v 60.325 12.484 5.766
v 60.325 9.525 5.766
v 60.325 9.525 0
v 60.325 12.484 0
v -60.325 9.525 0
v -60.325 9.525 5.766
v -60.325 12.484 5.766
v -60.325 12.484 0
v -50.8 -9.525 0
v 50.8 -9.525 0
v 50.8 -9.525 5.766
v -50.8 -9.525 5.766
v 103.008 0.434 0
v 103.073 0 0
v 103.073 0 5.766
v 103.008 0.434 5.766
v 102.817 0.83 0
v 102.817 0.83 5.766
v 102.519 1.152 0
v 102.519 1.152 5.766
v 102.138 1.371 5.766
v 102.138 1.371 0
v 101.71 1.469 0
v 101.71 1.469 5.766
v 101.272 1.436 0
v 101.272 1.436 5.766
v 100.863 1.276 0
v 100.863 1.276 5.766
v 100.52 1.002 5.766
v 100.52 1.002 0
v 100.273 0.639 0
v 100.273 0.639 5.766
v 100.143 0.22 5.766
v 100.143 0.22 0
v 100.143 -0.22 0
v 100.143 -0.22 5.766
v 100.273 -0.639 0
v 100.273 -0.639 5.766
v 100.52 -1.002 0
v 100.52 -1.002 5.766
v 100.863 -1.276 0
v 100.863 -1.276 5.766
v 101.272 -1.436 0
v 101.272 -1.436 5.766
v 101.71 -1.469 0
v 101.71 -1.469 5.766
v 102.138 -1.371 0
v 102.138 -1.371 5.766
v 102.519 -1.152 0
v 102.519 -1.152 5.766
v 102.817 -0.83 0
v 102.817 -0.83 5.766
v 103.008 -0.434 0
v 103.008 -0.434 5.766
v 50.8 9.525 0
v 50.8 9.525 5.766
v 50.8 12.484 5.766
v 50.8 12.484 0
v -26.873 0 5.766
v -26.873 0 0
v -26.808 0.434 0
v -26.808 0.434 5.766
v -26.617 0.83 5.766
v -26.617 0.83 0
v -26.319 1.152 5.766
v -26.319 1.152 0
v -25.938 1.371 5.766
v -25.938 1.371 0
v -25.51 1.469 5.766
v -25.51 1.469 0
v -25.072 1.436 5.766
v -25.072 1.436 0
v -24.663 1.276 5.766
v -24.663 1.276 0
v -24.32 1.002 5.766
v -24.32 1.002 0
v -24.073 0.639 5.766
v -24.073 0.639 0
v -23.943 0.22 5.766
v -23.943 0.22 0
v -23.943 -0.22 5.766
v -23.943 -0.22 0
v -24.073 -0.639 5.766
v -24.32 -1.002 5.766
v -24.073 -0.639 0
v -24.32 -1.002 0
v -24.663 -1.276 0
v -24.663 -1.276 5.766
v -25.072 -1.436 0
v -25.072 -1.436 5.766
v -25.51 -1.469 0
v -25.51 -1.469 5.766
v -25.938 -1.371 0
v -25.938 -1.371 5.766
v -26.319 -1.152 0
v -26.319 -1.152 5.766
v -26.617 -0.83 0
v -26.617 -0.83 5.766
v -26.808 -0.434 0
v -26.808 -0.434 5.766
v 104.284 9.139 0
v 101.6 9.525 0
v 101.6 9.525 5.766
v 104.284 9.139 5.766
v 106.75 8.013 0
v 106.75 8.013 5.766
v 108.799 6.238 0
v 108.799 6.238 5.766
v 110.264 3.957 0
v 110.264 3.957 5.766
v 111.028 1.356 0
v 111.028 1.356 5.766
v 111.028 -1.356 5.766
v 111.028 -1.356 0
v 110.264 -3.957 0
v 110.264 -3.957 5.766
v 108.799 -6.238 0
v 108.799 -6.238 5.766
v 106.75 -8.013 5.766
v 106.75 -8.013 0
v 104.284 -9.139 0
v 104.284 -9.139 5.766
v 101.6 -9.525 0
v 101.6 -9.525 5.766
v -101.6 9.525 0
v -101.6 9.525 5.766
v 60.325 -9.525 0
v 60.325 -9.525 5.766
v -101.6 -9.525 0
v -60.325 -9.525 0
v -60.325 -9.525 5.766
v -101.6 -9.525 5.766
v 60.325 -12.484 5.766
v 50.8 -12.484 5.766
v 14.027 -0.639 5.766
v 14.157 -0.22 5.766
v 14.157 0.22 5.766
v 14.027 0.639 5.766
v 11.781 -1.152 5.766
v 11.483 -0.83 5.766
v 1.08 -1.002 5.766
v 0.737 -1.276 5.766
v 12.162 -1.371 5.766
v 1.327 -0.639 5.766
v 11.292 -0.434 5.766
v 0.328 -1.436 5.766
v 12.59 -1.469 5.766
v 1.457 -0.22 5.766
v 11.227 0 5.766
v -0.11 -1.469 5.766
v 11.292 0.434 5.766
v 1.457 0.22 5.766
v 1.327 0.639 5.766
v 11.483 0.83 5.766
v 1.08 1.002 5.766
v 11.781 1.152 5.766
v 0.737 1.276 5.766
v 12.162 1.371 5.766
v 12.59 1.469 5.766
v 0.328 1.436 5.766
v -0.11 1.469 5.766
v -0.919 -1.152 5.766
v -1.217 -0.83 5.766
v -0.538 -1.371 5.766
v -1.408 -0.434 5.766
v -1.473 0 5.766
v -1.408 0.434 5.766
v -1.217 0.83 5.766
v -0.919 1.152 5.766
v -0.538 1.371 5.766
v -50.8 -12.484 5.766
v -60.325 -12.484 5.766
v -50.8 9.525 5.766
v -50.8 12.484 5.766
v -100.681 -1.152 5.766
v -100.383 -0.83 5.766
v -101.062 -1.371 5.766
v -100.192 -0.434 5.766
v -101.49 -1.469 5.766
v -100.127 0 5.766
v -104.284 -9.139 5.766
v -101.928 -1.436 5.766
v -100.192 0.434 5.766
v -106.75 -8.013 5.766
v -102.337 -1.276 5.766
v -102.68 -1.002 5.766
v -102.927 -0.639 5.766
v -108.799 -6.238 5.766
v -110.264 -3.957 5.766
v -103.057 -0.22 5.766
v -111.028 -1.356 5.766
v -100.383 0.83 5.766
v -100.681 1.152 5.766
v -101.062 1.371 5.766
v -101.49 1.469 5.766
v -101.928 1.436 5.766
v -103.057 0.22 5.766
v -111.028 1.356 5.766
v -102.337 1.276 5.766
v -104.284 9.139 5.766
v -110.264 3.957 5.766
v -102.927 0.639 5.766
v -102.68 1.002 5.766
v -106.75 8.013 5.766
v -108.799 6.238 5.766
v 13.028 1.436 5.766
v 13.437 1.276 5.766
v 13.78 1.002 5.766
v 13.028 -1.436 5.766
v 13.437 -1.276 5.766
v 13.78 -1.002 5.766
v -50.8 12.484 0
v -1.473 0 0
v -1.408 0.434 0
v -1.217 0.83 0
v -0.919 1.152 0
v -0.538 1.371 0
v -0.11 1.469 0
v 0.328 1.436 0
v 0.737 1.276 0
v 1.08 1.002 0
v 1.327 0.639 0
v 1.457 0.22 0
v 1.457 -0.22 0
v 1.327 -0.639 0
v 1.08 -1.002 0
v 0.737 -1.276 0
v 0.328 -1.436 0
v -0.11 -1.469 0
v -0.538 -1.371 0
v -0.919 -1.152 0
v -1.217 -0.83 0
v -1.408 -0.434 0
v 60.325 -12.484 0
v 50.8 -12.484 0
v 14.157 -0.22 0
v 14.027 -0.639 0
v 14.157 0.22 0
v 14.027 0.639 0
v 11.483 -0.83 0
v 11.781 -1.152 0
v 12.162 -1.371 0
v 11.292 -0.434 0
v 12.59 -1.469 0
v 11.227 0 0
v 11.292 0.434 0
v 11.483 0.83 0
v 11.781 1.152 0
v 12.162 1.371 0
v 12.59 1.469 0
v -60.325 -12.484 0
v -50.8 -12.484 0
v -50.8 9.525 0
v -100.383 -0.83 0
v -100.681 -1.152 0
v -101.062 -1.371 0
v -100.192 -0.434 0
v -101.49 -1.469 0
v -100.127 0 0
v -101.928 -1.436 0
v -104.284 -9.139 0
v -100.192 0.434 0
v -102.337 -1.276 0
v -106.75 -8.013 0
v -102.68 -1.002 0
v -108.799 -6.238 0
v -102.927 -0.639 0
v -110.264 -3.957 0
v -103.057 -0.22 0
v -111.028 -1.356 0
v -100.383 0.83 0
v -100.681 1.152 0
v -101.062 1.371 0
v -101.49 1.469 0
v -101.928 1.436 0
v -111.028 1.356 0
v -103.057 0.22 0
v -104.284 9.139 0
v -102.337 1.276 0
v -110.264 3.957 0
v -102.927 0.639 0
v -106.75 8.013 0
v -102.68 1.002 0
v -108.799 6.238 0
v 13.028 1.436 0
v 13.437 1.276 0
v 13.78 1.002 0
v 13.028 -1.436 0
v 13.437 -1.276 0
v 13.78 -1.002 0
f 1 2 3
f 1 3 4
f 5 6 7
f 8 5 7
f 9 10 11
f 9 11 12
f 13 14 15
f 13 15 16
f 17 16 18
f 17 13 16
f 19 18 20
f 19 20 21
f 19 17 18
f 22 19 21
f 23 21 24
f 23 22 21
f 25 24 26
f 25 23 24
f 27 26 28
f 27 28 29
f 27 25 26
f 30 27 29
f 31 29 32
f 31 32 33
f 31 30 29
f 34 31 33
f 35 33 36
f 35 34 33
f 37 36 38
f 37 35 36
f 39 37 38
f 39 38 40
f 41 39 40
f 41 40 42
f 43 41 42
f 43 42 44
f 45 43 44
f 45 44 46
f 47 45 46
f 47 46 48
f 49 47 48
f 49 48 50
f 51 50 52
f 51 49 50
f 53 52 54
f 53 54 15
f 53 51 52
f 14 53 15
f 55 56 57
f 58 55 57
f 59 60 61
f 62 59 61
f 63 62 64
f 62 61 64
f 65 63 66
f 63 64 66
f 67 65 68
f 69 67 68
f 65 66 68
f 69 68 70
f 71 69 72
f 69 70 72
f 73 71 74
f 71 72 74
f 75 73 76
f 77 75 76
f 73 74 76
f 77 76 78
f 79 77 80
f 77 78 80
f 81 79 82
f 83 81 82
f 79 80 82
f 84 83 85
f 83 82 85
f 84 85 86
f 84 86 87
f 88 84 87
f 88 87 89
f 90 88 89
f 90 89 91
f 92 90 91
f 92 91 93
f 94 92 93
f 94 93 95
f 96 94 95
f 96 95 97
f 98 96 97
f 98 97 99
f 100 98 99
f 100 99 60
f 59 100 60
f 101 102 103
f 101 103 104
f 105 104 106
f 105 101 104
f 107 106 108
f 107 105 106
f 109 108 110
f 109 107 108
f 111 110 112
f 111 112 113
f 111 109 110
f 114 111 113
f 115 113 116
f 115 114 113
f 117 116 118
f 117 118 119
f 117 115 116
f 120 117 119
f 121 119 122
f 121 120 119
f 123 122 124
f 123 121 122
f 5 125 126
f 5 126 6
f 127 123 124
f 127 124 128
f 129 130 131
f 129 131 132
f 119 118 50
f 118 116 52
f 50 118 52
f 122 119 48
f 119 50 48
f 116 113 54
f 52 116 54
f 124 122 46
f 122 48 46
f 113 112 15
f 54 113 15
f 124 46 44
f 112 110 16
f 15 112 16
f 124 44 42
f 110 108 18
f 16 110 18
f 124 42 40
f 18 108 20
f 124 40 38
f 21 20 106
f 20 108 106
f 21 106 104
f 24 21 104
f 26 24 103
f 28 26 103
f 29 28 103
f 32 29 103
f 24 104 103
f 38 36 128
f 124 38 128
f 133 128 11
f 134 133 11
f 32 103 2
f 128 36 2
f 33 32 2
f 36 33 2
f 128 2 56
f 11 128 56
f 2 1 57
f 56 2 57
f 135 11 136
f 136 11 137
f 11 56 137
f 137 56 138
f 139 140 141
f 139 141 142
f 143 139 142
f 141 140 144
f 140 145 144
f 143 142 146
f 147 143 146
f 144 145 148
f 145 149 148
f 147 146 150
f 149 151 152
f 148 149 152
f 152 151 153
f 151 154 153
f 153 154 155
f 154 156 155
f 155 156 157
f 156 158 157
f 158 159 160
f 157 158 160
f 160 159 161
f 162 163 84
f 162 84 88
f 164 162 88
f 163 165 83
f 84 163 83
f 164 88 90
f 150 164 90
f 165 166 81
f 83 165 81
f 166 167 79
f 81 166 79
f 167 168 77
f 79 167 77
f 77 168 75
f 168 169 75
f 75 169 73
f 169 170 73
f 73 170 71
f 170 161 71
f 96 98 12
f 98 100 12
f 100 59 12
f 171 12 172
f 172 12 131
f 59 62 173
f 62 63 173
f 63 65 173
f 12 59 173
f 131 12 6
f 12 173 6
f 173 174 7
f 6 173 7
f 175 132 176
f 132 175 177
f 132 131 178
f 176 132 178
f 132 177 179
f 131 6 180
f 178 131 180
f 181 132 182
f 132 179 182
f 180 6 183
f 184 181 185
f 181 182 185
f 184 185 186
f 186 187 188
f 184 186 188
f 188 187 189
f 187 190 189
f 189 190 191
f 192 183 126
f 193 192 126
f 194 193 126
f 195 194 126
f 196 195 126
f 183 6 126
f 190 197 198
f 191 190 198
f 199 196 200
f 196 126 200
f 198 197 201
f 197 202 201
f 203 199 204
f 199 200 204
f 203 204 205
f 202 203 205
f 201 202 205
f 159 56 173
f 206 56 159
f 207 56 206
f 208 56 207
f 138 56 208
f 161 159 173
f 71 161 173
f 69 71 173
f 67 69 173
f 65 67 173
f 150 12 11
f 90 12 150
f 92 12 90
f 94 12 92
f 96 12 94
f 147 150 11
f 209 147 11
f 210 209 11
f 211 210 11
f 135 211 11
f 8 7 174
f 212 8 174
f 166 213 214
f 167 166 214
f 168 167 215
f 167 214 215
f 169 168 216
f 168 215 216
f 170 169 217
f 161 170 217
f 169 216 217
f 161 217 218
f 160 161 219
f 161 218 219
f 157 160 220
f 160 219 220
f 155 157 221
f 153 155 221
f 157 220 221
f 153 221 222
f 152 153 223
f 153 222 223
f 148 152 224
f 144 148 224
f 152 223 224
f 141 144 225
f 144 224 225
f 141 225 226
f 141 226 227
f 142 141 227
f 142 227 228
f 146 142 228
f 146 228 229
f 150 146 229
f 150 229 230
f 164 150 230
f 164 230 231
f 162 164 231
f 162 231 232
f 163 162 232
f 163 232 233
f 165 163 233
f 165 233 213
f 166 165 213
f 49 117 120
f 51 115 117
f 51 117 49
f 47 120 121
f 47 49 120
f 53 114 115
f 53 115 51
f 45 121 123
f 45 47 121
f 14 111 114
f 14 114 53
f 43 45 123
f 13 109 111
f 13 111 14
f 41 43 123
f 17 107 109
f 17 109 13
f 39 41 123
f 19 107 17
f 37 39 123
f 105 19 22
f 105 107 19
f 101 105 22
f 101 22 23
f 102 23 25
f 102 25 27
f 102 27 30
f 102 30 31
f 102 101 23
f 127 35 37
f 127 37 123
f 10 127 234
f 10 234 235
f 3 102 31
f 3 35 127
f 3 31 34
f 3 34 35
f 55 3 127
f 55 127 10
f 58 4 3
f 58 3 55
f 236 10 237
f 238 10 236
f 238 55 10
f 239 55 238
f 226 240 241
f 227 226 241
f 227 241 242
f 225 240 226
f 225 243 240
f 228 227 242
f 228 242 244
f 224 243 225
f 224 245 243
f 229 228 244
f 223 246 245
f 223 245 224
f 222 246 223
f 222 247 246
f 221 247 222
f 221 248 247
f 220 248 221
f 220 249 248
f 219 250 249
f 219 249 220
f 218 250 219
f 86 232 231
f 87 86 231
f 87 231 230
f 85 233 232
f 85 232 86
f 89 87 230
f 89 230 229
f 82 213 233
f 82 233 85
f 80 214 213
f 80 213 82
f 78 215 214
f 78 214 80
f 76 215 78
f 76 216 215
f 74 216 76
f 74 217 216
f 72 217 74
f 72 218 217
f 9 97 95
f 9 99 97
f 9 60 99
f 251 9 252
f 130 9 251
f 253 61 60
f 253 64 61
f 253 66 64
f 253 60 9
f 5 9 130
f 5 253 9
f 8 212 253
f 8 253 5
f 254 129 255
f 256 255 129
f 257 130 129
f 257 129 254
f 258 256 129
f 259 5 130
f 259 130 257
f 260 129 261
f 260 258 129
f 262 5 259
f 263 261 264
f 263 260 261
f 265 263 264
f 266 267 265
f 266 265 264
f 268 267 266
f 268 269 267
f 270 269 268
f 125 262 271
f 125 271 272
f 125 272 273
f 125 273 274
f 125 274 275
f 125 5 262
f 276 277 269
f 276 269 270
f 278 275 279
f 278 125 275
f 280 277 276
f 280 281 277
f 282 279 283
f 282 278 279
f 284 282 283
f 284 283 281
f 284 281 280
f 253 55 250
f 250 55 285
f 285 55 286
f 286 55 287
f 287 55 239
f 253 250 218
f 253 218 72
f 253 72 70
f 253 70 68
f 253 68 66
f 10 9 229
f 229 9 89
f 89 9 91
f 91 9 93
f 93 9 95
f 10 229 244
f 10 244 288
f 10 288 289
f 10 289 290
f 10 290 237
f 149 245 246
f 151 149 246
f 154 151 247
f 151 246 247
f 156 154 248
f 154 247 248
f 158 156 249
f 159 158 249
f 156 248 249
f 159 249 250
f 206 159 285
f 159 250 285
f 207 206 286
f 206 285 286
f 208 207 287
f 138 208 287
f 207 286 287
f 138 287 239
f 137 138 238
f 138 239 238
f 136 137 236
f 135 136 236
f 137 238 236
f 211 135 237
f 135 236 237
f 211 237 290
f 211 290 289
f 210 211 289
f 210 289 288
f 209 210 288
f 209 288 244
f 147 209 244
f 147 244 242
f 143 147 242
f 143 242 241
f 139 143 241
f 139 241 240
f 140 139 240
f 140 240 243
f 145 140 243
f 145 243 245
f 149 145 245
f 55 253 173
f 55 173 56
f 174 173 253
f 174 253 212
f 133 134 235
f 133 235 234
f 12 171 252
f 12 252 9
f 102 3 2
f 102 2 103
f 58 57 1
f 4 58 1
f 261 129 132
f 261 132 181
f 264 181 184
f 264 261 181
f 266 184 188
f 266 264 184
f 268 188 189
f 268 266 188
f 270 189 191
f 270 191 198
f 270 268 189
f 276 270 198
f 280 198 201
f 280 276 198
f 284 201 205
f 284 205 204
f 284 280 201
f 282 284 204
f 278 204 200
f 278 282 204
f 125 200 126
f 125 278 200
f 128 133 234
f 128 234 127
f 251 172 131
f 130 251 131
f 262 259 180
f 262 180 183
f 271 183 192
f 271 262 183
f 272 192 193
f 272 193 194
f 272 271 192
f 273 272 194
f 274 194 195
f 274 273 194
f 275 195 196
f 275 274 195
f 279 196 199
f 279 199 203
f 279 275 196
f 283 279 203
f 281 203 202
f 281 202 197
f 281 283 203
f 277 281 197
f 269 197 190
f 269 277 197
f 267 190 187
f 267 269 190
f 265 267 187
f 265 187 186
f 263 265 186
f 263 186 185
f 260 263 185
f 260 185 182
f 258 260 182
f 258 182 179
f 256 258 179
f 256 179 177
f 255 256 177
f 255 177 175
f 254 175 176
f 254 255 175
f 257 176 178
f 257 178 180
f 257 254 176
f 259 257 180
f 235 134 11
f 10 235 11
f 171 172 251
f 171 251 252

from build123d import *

# Parameters (mm, degrees)
SKETCH1_R             = 1.4732
BOSS_EXTRUDE1_DEPTH   = 5.7658
F_4_CLEARANCE_HOLE1_D = 2.9464
SKETCH5_W             = 9.525
SKETCH5_H             = 2.9591
BOSS_EXTRUDE2_DEPTH   = 5.7658


with BuildPart() as part:
    # Sketch1 → Boss-Extrude1 (new body)
    with BuildSketch(Plane.XY):
        with BuildLine():
            Line((-101.6, 9.525), (101.6, 9.525))
            ThreePointArc((101.6, 9.525), (111.125, 0), (101.6, -9.525))
            Line((101.6, -9.525), (-101.6, -9.525))
            ThreePointArc((-101.6, -9.525), (-111.125, 0), (-101.6, 9.525))
        make_face()
        with Locations((-101.6, 0)):
            Circle(SKETCH1_R, mode=Mode.SUBTRACT)
        with Locations((101.6, 0)):
            Circle(SKETCH1_R, mode=Mode.SUBTRACT)
    extrude(amount=BOSS_EXTRUDE1_DEPTH)

    # #4 Clearance Hole1 (through all)
    with Locations(Plane.XY.offset(5.7658)):
        with Locations((-25.4, 0), (12.7, 0), (0, 0)):
            Hole(F_4_CLEARANCE_HOLE1_D / 2)

    # Sketch5 → Boss-Extrude2 (add)
    with BuildSketch(Plane.XY.offset(5.7658)):
        with Locations((55.5625, 11.00455)):
            Rectangle(SKETCH5_W, SKETCH5_H)
        with Locations((-55.5625, 11.00455)):
            Rectangle(SKETCH5_W, SKETCH5_H)
        with Locations((-55.5625, -11.00455)):
            Rectangle(SKETCH5_W, SKETCH5_H)
        with Locations((55.5625, -11.00455)):
            Rectangle(SKETCH5_W, SKETCH5_H)
    extrude(amount=-BOSS_EXTRUDE2_DEPTH)


solid = part.part
